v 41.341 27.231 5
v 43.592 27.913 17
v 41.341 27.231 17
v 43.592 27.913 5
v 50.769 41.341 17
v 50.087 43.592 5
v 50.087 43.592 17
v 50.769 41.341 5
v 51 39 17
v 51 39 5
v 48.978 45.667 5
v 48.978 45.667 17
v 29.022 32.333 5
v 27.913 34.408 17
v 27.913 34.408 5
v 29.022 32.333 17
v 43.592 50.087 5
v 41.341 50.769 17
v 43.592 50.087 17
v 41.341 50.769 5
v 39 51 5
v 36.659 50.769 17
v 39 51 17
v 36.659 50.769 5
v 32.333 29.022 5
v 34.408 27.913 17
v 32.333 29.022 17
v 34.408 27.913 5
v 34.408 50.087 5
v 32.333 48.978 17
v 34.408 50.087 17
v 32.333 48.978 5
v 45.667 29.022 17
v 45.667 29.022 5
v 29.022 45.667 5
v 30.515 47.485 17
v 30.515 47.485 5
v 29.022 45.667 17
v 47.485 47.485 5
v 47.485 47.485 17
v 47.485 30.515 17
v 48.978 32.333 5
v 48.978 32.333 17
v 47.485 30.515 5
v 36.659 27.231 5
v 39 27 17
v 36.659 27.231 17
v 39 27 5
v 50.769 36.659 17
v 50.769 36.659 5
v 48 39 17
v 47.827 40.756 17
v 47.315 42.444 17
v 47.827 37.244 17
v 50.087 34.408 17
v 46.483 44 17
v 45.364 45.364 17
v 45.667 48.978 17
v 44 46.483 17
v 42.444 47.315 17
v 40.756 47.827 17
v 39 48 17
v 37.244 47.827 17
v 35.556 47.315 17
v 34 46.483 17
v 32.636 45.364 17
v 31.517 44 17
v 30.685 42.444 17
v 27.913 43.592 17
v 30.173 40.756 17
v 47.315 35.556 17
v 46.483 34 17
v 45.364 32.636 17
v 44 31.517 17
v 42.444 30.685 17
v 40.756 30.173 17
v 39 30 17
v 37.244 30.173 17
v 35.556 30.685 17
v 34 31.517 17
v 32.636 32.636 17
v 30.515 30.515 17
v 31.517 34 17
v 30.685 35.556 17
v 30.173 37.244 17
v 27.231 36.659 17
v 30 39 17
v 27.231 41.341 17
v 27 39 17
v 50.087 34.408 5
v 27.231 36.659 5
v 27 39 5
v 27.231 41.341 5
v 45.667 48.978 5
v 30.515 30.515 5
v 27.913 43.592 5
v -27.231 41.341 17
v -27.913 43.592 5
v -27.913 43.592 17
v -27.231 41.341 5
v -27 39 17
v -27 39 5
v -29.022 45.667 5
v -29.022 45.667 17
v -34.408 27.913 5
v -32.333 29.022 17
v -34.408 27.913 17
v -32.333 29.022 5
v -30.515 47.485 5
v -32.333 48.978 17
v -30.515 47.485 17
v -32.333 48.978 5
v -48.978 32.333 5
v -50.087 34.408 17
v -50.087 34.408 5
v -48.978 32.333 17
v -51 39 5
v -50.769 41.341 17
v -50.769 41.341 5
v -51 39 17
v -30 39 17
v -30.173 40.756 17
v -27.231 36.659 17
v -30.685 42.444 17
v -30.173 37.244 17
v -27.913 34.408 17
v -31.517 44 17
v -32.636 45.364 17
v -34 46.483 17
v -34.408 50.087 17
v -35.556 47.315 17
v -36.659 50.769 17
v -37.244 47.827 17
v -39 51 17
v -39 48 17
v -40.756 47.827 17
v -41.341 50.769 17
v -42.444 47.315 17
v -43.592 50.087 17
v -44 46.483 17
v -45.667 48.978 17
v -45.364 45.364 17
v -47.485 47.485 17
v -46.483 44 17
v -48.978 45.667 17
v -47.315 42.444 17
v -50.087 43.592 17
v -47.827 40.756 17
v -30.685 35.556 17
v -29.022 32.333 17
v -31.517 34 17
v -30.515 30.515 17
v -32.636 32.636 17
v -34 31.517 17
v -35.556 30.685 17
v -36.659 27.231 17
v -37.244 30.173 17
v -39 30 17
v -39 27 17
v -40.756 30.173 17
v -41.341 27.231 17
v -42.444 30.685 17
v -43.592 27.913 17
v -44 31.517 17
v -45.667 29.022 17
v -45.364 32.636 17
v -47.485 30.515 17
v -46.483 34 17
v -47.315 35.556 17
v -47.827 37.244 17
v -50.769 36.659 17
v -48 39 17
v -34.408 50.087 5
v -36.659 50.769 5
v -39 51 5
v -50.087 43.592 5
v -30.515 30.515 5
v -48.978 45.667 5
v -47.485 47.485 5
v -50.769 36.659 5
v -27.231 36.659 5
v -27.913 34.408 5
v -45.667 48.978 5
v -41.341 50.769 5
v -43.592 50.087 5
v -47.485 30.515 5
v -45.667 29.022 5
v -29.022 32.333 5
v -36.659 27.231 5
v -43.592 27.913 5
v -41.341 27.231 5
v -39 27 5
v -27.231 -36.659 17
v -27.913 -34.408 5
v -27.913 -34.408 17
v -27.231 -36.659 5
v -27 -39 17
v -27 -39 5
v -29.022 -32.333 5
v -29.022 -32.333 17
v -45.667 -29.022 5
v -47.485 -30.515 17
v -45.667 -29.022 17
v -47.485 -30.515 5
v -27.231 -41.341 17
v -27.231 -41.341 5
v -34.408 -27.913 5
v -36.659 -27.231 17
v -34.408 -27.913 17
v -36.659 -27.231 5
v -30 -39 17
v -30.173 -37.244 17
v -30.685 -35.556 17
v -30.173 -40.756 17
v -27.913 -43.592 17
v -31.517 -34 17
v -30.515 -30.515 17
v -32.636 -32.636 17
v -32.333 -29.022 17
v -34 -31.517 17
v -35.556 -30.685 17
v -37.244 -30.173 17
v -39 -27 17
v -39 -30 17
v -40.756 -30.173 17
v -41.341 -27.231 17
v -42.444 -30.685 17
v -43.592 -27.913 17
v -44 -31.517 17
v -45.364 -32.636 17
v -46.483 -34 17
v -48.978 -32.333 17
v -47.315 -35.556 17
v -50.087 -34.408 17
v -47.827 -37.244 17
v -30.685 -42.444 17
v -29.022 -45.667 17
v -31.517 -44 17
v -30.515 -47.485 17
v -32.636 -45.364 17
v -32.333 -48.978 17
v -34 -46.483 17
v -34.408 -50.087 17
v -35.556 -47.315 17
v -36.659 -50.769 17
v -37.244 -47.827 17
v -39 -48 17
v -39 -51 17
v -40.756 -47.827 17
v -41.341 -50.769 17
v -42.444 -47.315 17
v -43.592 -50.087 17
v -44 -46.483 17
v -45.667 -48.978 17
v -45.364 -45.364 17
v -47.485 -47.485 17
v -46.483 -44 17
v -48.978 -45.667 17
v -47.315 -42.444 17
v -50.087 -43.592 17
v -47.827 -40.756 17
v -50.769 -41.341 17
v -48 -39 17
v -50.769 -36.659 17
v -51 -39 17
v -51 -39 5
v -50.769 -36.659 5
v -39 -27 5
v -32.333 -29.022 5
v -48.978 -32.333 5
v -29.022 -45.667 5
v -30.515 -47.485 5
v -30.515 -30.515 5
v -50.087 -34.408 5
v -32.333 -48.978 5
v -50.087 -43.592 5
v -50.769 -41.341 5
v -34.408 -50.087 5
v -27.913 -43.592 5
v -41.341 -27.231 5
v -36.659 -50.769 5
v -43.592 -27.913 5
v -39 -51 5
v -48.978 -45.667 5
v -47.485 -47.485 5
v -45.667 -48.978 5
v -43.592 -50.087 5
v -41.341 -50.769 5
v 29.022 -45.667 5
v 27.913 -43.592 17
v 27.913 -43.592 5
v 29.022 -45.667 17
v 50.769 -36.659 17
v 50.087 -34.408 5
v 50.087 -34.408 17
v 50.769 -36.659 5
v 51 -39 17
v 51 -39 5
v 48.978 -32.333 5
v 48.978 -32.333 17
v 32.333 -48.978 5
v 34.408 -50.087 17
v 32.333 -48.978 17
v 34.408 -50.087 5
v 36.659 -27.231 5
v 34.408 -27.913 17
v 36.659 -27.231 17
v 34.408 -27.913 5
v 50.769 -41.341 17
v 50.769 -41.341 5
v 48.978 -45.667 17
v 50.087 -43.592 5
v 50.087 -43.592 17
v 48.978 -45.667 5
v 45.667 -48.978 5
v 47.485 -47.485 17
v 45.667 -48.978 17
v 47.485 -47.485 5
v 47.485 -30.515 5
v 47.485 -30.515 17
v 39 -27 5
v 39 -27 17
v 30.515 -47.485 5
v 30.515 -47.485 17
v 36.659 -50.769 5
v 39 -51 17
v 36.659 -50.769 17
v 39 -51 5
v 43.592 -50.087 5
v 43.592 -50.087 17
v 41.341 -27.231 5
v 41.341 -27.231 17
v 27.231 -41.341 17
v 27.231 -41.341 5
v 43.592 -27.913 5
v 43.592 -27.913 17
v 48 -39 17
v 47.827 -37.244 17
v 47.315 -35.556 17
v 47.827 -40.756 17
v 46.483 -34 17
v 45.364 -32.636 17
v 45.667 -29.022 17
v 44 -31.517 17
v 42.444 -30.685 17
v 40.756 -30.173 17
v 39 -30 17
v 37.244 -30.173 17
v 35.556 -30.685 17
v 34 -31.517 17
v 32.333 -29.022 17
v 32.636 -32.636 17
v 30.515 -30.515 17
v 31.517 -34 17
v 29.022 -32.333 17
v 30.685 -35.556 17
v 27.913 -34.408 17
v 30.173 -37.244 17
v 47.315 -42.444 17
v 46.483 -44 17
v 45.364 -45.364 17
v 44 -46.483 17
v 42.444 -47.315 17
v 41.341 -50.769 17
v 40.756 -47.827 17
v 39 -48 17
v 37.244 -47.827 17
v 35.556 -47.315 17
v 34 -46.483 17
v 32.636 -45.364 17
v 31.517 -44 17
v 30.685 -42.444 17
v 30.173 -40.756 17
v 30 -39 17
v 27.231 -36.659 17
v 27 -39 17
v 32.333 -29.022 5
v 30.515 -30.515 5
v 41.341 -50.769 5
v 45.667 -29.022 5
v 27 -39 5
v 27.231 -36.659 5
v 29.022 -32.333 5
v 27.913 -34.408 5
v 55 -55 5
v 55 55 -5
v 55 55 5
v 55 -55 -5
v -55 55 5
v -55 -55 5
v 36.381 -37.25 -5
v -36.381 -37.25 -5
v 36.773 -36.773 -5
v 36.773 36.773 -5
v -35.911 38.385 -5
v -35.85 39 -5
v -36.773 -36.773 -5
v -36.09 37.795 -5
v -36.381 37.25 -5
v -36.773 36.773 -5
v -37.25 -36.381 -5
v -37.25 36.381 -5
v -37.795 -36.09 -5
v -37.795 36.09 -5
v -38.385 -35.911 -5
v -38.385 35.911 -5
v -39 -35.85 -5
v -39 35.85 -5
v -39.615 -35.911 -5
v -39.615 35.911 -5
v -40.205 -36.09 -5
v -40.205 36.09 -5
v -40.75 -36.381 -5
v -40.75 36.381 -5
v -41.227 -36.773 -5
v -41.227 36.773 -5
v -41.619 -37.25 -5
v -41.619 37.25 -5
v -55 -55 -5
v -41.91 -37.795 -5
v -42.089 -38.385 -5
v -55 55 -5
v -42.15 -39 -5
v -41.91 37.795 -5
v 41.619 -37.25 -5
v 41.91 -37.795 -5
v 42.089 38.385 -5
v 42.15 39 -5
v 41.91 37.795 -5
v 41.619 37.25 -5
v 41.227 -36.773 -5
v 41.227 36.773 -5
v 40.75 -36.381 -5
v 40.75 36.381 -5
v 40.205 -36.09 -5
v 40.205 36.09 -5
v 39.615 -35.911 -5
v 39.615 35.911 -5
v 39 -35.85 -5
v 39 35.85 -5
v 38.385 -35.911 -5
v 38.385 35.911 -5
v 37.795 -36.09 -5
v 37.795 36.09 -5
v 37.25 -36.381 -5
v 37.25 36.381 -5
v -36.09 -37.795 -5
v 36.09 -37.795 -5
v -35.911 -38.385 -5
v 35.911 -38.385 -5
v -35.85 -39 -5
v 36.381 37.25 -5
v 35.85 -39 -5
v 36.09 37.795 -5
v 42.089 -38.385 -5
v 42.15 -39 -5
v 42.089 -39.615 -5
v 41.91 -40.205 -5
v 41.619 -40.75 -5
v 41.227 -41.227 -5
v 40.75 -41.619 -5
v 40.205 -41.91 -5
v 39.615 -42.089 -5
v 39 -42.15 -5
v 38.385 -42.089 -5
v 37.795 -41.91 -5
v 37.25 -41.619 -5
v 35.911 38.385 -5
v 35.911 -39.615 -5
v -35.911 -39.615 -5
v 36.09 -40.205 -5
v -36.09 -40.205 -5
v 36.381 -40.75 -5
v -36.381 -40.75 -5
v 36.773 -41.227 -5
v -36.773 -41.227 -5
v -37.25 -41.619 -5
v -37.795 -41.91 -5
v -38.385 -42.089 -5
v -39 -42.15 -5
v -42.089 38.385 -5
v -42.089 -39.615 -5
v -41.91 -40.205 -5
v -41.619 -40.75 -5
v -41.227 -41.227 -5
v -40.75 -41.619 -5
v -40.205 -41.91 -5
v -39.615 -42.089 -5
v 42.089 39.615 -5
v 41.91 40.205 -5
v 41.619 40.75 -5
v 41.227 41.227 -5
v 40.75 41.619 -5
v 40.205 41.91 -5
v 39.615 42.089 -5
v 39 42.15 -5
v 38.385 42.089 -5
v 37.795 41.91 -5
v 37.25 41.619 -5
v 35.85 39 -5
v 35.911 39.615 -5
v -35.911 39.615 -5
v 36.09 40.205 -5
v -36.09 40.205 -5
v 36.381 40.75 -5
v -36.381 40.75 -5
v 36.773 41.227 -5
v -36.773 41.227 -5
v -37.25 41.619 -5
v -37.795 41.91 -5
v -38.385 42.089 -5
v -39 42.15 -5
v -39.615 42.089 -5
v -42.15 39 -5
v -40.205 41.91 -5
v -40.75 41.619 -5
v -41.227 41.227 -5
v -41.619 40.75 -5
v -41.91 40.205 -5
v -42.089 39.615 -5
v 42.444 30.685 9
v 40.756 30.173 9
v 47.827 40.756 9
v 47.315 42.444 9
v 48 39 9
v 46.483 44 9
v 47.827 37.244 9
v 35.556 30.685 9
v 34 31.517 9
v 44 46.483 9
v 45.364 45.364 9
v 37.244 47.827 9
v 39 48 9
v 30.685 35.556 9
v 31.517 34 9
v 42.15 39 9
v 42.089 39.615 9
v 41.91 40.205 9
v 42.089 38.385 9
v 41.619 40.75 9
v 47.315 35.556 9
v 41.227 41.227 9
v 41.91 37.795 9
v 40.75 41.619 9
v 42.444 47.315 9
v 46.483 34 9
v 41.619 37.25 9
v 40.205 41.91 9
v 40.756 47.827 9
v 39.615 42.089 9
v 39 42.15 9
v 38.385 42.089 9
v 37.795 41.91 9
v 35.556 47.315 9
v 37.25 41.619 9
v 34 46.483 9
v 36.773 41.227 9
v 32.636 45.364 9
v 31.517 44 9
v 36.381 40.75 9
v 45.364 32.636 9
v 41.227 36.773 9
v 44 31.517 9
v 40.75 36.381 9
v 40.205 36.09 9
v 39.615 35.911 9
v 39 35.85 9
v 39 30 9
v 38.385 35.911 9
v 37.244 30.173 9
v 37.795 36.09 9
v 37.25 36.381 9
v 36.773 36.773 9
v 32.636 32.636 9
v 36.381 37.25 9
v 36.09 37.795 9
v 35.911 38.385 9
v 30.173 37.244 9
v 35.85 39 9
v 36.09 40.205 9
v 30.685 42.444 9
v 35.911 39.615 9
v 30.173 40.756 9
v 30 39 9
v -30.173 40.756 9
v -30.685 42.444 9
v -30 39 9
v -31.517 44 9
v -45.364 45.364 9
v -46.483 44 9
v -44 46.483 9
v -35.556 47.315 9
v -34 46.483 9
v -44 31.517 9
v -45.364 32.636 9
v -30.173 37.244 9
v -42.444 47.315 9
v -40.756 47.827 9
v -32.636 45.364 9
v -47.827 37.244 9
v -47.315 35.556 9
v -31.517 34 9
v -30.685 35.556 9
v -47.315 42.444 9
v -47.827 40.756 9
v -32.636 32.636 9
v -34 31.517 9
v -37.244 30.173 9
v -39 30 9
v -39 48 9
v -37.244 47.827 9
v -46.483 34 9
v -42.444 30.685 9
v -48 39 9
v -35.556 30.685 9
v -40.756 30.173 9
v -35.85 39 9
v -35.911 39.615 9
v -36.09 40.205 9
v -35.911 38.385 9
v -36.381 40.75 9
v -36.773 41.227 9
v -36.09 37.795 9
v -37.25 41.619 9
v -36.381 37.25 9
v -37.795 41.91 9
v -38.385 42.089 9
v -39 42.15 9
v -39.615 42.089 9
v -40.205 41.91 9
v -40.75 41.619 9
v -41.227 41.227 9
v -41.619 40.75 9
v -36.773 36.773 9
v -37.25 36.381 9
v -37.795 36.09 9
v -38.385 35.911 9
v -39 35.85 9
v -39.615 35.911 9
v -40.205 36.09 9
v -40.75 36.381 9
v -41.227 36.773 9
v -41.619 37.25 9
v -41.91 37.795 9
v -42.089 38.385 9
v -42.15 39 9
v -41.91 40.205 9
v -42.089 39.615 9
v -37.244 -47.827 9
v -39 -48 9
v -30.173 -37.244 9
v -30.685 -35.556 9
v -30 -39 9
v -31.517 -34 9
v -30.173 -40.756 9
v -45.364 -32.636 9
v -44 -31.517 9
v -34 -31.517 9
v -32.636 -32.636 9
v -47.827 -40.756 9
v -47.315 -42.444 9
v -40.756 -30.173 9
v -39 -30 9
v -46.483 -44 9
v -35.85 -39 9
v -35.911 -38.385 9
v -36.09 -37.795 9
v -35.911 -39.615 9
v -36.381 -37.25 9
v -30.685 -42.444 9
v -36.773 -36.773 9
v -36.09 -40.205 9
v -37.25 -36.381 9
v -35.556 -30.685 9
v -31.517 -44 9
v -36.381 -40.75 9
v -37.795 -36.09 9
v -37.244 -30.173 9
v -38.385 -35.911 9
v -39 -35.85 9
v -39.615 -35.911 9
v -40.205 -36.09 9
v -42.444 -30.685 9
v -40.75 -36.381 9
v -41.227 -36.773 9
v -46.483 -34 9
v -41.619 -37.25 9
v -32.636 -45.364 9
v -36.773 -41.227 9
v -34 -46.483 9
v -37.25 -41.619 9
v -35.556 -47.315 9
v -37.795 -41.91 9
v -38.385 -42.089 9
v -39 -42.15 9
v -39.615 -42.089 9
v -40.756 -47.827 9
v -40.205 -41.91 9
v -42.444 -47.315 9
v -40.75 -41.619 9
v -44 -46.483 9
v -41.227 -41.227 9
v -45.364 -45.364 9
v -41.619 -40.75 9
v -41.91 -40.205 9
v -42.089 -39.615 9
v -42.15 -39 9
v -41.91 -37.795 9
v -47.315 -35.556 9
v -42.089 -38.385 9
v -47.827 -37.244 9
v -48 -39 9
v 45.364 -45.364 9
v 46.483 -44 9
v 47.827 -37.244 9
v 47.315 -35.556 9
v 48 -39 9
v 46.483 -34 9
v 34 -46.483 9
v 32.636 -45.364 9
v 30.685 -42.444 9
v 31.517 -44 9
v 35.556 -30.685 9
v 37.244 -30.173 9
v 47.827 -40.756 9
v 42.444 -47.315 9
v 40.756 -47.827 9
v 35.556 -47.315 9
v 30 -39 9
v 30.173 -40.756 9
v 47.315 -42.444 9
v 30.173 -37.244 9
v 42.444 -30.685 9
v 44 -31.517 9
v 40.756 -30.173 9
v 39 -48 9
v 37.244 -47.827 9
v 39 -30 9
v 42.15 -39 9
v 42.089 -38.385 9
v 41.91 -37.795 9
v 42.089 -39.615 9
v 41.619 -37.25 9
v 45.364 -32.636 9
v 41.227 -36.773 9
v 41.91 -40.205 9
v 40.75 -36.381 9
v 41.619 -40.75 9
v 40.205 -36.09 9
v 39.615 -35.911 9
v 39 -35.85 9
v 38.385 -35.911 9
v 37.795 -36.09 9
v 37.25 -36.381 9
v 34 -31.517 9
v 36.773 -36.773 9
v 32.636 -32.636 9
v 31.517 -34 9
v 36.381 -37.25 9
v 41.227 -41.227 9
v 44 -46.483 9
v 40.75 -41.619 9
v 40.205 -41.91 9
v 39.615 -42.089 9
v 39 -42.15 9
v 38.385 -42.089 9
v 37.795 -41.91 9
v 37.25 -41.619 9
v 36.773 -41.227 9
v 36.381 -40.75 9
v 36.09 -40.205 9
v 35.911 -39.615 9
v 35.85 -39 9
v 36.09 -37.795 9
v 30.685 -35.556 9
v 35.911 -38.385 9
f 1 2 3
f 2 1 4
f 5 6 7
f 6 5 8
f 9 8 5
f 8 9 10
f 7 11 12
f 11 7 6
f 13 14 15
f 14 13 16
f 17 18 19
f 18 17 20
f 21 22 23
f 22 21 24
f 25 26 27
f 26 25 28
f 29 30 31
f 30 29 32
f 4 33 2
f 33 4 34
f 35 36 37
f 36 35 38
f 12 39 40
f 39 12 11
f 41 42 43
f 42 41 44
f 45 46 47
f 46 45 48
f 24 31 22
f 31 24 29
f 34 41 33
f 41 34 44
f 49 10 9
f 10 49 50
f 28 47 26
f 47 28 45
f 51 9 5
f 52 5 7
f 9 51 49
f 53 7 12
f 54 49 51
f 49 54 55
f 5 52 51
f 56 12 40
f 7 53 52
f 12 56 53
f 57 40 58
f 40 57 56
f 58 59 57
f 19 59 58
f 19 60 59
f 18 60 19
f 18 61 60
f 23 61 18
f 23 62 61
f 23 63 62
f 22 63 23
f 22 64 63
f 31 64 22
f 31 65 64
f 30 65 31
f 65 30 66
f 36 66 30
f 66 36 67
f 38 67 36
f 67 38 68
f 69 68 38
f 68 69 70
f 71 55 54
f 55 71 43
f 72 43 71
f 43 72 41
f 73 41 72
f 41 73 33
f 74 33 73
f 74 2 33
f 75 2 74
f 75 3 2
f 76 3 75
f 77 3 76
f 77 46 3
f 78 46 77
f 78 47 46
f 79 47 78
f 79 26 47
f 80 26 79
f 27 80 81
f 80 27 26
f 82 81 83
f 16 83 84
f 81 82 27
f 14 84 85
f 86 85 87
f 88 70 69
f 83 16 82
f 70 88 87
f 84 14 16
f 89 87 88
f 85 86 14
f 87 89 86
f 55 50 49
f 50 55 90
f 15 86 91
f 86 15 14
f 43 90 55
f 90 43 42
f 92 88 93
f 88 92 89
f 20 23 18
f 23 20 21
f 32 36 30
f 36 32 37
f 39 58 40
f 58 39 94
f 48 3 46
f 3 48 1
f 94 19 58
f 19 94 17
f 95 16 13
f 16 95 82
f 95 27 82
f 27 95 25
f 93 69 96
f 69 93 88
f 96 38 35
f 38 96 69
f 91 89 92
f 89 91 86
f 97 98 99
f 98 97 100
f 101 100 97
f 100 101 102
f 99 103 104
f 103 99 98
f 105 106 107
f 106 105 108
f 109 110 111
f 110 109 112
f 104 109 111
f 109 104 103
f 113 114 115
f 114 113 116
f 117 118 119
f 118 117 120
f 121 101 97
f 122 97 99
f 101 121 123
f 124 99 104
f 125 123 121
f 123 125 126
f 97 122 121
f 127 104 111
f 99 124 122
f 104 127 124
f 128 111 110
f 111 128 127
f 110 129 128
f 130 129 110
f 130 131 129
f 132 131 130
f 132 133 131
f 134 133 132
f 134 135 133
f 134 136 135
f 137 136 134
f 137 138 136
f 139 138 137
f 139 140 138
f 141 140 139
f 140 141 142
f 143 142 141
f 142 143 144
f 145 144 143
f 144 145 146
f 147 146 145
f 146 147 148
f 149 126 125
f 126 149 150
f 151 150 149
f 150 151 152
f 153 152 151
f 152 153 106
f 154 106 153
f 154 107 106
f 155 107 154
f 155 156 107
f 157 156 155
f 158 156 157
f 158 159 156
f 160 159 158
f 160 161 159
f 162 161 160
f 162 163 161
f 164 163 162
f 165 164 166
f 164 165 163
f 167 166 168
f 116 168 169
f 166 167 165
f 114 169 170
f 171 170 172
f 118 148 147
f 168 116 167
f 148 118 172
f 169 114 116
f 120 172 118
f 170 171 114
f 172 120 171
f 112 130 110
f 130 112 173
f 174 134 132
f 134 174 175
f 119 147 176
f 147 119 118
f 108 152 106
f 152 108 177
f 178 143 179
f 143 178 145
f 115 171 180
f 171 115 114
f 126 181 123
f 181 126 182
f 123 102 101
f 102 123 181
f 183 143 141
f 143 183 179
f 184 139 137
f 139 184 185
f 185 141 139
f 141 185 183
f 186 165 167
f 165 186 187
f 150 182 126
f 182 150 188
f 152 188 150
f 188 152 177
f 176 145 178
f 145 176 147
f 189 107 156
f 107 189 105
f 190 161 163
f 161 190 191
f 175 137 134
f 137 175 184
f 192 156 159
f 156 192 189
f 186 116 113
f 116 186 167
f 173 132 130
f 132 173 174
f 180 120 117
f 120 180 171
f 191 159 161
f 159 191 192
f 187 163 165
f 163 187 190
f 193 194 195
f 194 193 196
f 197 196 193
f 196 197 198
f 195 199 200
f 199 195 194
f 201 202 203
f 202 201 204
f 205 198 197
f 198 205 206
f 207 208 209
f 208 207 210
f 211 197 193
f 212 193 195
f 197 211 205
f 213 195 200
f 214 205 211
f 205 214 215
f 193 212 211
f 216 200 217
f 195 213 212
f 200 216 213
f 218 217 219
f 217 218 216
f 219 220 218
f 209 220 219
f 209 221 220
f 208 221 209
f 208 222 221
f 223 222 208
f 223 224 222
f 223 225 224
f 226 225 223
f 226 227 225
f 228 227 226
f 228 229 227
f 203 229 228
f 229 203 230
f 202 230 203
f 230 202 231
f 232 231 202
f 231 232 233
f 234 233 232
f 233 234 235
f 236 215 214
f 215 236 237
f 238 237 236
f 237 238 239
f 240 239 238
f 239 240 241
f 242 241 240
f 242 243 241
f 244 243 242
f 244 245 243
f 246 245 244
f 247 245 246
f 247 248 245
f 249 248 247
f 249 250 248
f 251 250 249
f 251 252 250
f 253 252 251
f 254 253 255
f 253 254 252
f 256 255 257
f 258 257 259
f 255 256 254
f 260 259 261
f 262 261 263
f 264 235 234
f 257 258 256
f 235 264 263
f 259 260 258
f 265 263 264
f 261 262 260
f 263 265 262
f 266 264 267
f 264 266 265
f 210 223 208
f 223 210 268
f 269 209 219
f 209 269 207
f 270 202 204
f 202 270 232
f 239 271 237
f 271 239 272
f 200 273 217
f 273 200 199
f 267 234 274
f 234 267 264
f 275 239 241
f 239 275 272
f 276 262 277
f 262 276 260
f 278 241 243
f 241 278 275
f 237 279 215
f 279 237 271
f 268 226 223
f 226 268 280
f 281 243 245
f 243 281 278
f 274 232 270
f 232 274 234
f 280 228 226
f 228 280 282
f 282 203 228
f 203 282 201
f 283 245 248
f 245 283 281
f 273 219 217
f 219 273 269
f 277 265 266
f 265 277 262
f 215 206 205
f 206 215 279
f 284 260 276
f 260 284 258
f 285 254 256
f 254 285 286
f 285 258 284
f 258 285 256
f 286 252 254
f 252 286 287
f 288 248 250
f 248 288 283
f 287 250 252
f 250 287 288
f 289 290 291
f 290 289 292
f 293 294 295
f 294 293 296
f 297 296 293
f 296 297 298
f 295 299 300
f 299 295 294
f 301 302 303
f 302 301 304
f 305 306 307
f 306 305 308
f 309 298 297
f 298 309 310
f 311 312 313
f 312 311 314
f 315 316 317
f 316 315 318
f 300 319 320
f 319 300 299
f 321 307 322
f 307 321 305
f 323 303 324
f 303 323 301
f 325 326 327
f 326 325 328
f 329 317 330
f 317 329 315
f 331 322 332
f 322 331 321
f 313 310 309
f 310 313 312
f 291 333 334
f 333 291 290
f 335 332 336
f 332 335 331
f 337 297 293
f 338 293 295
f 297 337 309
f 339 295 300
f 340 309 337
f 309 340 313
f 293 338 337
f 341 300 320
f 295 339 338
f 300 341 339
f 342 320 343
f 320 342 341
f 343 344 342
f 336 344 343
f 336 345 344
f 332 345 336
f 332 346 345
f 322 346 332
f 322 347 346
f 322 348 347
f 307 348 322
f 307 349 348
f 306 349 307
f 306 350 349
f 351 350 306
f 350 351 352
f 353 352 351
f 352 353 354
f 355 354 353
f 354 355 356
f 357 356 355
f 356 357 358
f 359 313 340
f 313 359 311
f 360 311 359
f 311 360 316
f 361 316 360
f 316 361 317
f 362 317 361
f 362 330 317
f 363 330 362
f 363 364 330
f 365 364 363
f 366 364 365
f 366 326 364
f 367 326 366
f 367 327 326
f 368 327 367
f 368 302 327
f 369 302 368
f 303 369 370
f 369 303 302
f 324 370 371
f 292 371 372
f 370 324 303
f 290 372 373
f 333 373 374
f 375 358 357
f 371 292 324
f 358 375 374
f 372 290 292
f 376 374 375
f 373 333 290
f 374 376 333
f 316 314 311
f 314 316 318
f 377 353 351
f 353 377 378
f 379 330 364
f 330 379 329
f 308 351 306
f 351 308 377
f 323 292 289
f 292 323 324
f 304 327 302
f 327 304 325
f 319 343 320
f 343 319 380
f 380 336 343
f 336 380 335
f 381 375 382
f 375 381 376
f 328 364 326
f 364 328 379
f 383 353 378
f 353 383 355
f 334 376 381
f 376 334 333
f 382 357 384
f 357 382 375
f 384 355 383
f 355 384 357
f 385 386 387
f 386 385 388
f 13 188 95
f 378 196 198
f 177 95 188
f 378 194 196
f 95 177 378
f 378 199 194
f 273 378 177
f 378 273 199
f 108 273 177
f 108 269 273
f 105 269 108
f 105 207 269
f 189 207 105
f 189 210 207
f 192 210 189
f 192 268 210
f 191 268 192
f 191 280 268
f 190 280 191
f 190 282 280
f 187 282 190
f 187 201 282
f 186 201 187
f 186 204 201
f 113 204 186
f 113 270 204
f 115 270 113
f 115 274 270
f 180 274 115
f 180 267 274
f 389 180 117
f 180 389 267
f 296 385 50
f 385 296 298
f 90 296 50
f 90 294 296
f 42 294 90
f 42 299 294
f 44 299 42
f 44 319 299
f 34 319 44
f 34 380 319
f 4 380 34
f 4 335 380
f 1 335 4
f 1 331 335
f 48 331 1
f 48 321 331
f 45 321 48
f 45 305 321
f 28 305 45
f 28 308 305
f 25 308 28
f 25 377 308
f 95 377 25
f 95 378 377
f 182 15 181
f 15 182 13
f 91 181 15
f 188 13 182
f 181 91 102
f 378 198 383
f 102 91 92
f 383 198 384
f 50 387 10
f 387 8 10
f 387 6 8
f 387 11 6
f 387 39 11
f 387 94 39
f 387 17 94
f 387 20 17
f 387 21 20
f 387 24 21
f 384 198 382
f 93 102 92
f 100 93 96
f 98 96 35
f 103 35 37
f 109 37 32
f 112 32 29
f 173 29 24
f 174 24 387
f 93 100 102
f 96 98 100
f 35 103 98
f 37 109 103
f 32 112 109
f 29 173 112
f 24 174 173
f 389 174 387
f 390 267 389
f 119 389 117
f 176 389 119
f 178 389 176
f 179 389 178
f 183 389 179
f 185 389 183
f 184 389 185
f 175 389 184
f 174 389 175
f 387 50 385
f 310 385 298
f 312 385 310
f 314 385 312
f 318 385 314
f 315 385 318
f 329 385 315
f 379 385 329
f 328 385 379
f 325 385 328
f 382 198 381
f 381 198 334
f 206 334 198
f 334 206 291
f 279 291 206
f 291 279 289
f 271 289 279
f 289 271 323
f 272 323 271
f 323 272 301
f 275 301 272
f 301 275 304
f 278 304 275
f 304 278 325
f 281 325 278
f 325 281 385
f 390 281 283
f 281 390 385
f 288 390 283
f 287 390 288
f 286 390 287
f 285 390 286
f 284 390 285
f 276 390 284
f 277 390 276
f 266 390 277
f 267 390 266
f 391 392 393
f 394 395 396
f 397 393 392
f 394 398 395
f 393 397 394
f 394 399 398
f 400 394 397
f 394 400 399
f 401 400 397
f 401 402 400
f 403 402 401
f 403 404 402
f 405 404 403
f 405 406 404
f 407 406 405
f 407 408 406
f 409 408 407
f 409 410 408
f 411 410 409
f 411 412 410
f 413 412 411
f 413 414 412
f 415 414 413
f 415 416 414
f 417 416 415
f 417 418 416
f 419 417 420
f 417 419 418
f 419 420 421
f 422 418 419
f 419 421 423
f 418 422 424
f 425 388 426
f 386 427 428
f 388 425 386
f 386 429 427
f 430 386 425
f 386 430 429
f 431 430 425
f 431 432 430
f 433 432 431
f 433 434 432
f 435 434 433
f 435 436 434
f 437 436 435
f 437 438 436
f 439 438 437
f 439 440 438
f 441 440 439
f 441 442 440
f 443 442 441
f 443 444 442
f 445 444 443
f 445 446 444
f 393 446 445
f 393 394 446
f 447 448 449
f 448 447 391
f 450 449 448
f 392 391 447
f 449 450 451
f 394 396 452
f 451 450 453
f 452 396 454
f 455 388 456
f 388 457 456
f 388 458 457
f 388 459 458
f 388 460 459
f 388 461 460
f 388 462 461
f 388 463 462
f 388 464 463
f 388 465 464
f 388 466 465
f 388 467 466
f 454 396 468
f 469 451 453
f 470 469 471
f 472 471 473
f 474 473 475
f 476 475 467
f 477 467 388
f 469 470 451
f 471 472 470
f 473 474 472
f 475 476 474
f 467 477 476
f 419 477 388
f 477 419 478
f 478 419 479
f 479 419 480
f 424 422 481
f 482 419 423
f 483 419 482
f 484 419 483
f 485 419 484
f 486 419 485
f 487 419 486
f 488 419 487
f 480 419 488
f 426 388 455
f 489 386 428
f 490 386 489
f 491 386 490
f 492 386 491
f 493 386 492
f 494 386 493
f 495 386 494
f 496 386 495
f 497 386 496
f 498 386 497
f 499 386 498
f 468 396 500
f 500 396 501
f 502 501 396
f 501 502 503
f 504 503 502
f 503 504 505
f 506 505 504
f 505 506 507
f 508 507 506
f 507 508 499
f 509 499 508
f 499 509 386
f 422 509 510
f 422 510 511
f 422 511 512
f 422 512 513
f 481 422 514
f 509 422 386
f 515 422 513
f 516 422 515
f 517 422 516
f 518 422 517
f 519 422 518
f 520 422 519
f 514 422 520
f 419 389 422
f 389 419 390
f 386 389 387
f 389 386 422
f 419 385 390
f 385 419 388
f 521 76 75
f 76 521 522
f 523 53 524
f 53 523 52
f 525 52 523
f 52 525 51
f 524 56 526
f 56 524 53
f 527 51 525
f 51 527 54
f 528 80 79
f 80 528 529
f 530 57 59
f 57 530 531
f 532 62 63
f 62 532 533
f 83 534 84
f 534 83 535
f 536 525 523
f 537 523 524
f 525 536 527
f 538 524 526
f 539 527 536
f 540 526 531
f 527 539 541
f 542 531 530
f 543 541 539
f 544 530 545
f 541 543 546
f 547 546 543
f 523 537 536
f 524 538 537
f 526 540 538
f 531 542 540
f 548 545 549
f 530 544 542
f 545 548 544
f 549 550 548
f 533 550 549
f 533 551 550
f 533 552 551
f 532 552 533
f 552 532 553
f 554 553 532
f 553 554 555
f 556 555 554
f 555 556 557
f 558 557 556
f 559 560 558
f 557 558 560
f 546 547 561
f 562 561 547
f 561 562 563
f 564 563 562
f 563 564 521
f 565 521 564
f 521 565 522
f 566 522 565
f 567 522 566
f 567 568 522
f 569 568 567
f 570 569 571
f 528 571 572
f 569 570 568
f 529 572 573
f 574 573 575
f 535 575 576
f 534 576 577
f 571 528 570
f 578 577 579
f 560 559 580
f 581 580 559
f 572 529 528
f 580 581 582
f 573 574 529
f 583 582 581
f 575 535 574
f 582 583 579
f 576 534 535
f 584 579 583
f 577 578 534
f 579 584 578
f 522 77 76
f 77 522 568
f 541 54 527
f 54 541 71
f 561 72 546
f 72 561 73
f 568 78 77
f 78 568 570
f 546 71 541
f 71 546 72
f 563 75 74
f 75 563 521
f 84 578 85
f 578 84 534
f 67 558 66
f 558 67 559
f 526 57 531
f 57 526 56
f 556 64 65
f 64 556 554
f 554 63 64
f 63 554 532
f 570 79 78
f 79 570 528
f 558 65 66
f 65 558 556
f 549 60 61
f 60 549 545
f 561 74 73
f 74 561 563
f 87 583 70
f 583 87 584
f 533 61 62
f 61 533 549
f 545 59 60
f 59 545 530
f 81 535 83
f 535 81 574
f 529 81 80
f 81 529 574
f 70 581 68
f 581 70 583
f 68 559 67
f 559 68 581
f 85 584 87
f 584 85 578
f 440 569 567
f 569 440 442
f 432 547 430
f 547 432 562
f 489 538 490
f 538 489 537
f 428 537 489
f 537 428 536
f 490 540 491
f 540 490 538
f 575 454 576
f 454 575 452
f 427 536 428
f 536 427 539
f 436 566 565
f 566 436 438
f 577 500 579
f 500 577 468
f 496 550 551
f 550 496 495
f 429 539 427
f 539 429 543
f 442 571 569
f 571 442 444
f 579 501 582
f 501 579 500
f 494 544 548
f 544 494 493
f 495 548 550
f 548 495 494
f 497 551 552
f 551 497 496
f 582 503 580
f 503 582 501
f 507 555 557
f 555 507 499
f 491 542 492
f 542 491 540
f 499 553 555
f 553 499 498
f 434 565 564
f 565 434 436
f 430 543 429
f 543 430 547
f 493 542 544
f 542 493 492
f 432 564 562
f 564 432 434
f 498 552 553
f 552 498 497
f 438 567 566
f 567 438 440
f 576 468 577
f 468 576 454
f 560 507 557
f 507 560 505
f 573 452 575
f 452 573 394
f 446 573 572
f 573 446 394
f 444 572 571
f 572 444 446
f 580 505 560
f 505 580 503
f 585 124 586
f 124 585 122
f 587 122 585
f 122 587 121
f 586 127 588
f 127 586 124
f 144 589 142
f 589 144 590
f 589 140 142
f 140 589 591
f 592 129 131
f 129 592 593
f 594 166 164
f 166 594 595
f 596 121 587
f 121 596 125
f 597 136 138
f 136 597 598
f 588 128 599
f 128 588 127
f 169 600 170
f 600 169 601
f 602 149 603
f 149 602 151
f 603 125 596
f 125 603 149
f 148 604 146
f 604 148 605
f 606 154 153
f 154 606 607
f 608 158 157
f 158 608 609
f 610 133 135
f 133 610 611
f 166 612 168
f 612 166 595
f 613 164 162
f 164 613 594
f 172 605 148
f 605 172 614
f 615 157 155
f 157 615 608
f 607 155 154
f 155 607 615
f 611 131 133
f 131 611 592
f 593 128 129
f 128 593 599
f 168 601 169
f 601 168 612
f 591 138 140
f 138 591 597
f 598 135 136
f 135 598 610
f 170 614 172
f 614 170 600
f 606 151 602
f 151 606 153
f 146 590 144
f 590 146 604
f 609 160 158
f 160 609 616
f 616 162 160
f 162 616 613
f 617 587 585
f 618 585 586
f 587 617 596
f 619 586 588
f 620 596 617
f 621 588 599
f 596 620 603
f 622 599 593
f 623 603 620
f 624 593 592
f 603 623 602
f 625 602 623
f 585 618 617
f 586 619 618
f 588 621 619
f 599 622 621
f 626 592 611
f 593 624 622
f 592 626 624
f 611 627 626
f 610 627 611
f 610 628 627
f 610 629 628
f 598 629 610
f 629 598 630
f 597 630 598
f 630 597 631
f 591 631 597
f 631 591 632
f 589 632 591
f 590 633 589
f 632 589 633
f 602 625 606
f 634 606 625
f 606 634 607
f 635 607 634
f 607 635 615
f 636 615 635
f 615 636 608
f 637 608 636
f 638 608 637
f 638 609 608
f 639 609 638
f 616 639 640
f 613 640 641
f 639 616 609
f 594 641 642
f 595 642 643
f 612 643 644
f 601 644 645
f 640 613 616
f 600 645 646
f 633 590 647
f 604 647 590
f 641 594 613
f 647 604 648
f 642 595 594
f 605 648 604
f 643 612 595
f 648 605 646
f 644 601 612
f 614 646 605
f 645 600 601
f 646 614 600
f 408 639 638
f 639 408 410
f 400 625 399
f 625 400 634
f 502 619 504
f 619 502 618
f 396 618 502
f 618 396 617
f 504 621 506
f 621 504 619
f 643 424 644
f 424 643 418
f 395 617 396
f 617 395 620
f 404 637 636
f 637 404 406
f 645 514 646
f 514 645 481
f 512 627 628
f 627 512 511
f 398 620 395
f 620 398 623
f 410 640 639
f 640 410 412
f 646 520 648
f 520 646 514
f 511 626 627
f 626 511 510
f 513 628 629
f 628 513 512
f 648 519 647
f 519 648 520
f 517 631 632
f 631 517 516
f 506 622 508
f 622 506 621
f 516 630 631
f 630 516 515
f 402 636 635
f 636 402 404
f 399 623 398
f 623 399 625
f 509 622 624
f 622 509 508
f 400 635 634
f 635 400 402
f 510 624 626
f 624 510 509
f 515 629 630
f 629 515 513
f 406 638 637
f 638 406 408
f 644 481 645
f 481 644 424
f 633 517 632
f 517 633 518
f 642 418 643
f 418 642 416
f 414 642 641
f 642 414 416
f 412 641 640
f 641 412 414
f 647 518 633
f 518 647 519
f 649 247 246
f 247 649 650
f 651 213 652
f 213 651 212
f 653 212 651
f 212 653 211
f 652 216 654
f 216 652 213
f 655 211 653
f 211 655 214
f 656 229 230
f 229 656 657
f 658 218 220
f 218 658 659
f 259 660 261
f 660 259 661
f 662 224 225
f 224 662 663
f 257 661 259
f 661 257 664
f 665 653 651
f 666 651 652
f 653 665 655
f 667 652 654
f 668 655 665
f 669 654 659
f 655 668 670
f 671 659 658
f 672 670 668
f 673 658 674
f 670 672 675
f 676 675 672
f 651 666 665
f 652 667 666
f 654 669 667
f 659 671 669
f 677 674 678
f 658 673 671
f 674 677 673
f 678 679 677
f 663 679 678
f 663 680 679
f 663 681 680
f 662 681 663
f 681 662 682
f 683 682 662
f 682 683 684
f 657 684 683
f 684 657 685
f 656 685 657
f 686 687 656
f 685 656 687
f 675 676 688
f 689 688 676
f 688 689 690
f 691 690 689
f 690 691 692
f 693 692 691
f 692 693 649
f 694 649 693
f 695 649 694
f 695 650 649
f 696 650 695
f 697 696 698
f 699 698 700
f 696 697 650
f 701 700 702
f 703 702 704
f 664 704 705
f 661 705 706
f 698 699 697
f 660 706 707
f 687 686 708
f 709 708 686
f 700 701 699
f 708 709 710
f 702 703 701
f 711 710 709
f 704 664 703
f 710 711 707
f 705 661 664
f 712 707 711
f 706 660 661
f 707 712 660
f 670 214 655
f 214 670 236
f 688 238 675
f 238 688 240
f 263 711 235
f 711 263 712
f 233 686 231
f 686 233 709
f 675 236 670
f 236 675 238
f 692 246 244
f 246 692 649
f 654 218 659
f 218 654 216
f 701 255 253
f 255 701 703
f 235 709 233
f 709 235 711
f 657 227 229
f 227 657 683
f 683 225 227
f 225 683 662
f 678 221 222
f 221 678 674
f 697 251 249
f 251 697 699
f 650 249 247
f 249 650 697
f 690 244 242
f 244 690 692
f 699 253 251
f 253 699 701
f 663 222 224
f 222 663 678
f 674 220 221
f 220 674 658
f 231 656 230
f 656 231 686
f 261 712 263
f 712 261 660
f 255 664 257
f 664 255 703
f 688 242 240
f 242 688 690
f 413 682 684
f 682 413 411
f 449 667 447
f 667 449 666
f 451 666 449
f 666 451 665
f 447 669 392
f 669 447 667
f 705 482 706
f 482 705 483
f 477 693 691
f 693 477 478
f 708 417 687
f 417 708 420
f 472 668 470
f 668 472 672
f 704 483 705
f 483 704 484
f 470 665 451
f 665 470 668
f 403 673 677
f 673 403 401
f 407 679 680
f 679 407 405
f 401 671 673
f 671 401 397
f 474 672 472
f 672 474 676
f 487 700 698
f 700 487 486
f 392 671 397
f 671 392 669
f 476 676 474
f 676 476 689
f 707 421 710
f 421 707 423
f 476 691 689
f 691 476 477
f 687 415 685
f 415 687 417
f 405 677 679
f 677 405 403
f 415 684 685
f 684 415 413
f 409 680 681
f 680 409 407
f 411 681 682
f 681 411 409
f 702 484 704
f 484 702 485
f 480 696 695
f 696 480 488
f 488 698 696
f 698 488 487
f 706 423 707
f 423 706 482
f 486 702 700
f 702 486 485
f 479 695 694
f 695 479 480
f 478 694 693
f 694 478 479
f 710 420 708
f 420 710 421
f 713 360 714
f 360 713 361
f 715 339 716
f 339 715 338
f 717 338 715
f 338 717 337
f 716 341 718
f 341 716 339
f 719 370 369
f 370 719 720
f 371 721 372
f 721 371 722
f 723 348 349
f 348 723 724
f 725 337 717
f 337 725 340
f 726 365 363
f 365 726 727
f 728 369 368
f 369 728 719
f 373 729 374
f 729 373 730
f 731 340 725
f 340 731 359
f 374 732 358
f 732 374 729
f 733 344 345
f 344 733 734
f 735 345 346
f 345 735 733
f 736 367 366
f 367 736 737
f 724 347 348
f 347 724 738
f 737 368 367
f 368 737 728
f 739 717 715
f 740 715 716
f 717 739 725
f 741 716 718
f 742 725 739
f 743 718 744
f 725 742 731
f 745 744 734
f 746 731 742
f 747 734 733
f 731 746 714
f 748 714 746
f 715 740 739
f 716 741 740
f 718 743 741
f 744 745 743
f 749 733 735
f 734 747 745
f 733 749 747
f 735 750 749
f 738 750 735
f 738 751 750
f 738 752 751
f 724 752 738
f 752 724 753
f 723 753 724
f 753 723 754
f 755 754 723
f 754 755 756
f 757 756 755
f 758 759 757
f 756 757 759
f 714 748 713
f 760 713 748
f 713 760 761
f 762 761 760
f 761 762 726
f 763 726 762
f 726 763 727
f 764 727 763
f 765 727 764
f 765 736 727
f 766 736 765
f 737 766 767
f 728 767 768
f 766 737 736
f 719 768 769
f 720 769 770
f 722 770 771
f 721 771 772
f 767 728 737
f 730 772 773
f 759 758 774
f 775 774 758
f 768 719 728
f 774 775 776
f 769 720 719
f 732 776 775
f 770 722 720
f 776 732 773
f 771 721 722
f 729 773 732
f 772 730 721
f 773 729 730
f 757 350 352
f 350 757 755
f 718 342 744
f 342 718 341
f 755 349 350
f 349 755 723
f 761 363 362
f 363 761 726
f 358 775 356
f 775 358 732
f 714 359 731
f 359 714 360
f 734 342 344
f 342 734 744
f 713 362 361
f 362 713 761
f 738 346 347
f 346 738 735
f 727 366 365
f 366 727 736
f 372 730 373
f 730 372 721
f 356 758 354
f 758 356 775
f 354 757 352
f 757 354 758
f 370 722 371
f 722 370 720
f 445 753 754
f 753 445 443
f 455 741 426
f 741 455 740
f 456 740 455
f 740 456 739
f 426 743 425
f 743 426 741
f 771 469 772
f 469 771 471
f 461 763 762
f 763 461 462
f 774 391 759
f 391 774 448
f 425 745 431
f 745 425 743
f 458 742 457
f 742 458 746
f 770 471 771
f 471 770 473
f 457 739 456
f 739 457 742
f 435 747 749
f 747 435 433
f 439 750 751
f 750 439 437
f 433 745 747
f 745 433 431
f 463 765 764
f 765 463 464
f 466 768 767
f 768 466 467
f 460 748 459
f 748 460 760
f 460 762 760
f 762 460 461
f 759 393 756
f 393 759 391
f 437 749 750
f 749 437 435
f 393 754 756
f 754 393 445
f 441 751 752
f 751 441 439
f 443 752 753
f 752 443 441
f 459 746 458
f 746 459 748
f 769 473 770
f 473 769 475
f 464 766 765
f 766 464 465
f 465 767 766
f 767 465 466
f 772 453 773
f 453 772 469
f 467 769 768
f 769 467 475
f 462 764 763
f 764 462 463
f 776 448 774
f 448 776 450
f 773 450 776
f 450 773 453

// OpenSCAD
$fn = 32;

// ----------------------------------------------------------------------
// Socket pad plate
// bosses with counterbored sockets for the screws
// ----------------------------------------------------------------------

// --- parameters (mm) ---
base_t = 10;             // base plate thickness
boss_h = 12;             // boss height above the base plate
boss_d = 24;             // boss diameter
socket_d = 18;           // socket diameter
socket_depth = 8;        // socket depth from the boss face
bolt_d = 6.3;            // screw clearance hole through the socket floor
plate = [110, 110, 10];  // overall size (x, y, z)
edge = 16;               // boss centre offset from the plate edge
pads = 4;                // boss count, one per corner

// --- derived feature positions (mm) ---
height = base_t + boss_h;        // = 22   overall height of the part
corner_x = plate[0] / 2 - edge;  // = 39   boss centre X
corner_y = plate[1] / 2 - edge;  // = 39   boss centre Y
feature_centers = [
  [corner_x, corner_y],
  [-corner_x, corner_y],
  [-corner_x, -corner_y],
  [corner_x, -corner_y]
];   // boss centres: sockets, holes and the pads themselves are placed from here

// base plate, bosses on feature_centers, socket + through hole in each
difference() {
  union() {
    cube(plate, center = true);
    for (centre = feature_centers)
      translate([centre[0], centre[1], plate[2] / 2 - 1])
        cylinder(d = boss_d, h = boss_h + 1);
  }
  for (centre = feature_centers) {
    translate([centre[0], centre[1], plate[2] / 2 + boss_h - socket_depth])
      cylinder(d = socket_d, h = socket_depth + 1);
    translate([centre[0], centre[1], -height])
      cylinder(d = bolt_d, h = 2 * height + 2);  // through the socket floor
  }
}
